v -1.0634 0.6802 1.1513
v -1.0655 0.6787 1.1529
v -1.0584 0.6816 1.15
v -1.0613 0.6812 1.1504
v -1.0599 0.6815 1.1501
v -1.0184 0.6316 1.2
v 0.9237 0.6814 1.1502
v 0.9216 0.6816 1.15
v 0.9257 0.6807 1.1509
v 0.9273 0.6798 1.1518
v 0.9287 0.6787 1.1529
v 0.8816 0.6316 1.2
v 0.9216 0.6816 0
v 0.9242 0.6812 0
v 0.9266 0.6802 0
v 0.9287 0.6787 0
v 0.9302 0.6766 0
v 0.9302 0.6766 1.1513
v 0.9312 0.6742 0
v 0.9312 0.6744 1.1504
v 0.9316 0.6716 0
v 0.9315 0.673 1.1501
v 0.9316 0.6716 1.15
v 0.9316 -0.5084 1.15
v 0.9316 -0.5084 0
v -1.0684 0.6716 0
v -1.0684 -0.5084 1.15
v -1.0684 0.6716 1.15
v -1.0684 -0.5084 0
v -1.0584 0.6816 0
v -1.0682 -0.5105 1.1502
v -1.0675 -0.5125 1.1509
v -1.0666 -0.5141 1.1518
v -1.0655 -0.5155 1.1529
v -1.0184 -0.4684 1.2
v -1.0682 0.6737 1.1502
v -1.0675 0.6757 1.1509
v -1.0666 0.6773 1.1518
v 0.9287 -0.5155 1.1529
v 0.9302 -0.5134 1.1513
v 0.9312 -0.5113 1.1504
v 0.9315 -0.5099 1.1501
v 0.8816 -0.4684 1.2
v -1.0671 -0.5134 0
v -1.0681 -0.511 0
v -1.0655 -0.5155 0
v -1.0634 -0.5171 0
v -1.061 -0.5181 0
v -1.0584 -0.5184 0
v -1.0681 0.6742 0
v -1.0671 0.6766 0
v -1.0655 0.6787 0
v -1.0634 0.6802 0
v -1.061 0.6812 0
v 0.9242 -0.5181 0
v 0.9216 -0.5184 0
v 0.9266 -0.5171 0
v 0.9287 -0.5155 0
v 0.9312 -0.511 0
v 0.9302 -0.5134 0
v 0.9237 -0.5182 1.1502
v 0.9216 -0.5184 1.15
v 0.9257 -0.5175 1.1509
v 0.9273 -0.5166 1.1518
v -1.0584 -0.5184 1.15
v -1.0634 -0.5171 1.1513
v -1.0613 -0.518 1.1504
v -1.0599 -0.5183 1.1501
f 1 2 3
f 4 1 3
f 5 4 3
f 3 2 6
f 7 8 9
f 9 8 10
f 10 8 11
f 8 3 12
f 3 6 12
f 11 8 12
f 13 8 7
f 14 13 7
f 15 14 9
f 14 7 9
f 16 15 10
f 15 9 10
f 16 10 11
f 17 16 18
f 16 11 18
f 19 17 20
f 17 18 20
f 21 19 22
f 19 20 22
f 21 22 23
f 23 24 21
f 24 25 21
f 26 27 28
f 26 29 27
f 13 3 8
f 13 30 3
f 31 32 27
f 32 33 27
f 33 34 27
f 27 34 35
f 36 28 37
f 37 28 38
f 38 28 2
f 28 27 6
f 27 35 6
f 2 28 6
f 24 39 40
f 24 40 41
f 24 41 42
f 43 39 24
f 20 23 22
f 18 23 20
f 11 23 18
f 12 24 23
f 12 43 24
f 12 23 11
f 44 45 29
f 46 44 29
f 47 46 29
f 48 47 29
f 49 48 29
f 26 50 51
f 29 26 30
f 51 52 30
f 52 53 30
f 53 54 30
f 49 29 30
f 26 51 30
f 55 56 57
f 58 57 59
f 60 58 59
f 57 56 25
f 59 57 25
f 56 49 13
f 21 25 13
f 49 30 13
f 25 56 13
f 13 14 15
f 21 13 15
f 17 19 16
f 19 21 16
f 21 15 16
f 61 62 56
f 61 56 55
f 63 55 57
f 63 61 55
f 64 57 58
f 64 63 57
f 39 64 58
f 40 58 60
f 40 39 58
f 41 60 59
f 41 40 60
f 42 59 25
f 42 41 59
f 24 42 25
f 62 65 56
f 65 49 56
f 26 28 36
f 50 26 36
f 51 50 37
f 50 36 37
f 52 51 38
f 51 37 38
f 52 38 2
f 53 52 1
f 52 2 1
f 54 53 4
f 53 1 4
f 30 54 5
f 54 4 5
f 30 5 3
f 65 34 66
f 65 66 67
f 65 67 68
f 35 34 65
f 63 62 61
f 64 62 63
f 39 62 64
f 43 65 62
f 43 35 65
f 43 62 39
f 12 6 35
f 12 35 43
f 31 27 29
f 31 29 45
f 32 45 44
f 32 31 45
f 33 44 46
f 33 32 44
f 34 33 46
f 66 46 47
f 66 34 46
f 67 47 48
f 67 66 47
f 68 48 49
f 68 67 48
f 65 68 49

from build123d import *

# Parameters (mm, degrees)
SKETCH1_W           = 2
SKETCH1_H           = 1.2
BOSS_EXTRUDE1_DEPTH = 1.2
CHAMFER1_SIZE       = 0.05
FILLET1_R           = 0.01


with BuildPart() as part:
    # Sketch1 → Boss-Extrude1 (new body)
    with BuildSketch(Plane.XY):
        with Locations((-0.068421053, 0.081578947)):
            Rectangle(SKETCH1_W, SKETCH1_H)
    extrude(amount=BOSS_EXTRUDE1_DEPTH)

    # Chamfer1
    chamfer1_edges = [part.edges().sort_by_distance(p)[0] for p in [
        (0.931578947, 0.081578947, 1.2),
        (-0.068421053, 0.681578947, 1.2),
        (-1.068421053, 0.081578947, 1.2),
        (-0.068421053, -0.518421053, 1.2),
    ]]
    chamfer(chamfer1_edges, length=CHAMFER1_SIZE)

    # Fillet1
    fillet1_edges = [part.edges().sort_by_distance(p)[0] for p in [
        (0.931578947, 0.681578947, 0.575),
        (0.931578947, -0.518421053, 0.575),
        (-1.068421053, 0.681578947, 0.575),
        (-1.068421053, -0.518421053, 0.575),
    ]]
    fillet(fillet1_edges, radius=FILLET1_R)


solid = part.part
